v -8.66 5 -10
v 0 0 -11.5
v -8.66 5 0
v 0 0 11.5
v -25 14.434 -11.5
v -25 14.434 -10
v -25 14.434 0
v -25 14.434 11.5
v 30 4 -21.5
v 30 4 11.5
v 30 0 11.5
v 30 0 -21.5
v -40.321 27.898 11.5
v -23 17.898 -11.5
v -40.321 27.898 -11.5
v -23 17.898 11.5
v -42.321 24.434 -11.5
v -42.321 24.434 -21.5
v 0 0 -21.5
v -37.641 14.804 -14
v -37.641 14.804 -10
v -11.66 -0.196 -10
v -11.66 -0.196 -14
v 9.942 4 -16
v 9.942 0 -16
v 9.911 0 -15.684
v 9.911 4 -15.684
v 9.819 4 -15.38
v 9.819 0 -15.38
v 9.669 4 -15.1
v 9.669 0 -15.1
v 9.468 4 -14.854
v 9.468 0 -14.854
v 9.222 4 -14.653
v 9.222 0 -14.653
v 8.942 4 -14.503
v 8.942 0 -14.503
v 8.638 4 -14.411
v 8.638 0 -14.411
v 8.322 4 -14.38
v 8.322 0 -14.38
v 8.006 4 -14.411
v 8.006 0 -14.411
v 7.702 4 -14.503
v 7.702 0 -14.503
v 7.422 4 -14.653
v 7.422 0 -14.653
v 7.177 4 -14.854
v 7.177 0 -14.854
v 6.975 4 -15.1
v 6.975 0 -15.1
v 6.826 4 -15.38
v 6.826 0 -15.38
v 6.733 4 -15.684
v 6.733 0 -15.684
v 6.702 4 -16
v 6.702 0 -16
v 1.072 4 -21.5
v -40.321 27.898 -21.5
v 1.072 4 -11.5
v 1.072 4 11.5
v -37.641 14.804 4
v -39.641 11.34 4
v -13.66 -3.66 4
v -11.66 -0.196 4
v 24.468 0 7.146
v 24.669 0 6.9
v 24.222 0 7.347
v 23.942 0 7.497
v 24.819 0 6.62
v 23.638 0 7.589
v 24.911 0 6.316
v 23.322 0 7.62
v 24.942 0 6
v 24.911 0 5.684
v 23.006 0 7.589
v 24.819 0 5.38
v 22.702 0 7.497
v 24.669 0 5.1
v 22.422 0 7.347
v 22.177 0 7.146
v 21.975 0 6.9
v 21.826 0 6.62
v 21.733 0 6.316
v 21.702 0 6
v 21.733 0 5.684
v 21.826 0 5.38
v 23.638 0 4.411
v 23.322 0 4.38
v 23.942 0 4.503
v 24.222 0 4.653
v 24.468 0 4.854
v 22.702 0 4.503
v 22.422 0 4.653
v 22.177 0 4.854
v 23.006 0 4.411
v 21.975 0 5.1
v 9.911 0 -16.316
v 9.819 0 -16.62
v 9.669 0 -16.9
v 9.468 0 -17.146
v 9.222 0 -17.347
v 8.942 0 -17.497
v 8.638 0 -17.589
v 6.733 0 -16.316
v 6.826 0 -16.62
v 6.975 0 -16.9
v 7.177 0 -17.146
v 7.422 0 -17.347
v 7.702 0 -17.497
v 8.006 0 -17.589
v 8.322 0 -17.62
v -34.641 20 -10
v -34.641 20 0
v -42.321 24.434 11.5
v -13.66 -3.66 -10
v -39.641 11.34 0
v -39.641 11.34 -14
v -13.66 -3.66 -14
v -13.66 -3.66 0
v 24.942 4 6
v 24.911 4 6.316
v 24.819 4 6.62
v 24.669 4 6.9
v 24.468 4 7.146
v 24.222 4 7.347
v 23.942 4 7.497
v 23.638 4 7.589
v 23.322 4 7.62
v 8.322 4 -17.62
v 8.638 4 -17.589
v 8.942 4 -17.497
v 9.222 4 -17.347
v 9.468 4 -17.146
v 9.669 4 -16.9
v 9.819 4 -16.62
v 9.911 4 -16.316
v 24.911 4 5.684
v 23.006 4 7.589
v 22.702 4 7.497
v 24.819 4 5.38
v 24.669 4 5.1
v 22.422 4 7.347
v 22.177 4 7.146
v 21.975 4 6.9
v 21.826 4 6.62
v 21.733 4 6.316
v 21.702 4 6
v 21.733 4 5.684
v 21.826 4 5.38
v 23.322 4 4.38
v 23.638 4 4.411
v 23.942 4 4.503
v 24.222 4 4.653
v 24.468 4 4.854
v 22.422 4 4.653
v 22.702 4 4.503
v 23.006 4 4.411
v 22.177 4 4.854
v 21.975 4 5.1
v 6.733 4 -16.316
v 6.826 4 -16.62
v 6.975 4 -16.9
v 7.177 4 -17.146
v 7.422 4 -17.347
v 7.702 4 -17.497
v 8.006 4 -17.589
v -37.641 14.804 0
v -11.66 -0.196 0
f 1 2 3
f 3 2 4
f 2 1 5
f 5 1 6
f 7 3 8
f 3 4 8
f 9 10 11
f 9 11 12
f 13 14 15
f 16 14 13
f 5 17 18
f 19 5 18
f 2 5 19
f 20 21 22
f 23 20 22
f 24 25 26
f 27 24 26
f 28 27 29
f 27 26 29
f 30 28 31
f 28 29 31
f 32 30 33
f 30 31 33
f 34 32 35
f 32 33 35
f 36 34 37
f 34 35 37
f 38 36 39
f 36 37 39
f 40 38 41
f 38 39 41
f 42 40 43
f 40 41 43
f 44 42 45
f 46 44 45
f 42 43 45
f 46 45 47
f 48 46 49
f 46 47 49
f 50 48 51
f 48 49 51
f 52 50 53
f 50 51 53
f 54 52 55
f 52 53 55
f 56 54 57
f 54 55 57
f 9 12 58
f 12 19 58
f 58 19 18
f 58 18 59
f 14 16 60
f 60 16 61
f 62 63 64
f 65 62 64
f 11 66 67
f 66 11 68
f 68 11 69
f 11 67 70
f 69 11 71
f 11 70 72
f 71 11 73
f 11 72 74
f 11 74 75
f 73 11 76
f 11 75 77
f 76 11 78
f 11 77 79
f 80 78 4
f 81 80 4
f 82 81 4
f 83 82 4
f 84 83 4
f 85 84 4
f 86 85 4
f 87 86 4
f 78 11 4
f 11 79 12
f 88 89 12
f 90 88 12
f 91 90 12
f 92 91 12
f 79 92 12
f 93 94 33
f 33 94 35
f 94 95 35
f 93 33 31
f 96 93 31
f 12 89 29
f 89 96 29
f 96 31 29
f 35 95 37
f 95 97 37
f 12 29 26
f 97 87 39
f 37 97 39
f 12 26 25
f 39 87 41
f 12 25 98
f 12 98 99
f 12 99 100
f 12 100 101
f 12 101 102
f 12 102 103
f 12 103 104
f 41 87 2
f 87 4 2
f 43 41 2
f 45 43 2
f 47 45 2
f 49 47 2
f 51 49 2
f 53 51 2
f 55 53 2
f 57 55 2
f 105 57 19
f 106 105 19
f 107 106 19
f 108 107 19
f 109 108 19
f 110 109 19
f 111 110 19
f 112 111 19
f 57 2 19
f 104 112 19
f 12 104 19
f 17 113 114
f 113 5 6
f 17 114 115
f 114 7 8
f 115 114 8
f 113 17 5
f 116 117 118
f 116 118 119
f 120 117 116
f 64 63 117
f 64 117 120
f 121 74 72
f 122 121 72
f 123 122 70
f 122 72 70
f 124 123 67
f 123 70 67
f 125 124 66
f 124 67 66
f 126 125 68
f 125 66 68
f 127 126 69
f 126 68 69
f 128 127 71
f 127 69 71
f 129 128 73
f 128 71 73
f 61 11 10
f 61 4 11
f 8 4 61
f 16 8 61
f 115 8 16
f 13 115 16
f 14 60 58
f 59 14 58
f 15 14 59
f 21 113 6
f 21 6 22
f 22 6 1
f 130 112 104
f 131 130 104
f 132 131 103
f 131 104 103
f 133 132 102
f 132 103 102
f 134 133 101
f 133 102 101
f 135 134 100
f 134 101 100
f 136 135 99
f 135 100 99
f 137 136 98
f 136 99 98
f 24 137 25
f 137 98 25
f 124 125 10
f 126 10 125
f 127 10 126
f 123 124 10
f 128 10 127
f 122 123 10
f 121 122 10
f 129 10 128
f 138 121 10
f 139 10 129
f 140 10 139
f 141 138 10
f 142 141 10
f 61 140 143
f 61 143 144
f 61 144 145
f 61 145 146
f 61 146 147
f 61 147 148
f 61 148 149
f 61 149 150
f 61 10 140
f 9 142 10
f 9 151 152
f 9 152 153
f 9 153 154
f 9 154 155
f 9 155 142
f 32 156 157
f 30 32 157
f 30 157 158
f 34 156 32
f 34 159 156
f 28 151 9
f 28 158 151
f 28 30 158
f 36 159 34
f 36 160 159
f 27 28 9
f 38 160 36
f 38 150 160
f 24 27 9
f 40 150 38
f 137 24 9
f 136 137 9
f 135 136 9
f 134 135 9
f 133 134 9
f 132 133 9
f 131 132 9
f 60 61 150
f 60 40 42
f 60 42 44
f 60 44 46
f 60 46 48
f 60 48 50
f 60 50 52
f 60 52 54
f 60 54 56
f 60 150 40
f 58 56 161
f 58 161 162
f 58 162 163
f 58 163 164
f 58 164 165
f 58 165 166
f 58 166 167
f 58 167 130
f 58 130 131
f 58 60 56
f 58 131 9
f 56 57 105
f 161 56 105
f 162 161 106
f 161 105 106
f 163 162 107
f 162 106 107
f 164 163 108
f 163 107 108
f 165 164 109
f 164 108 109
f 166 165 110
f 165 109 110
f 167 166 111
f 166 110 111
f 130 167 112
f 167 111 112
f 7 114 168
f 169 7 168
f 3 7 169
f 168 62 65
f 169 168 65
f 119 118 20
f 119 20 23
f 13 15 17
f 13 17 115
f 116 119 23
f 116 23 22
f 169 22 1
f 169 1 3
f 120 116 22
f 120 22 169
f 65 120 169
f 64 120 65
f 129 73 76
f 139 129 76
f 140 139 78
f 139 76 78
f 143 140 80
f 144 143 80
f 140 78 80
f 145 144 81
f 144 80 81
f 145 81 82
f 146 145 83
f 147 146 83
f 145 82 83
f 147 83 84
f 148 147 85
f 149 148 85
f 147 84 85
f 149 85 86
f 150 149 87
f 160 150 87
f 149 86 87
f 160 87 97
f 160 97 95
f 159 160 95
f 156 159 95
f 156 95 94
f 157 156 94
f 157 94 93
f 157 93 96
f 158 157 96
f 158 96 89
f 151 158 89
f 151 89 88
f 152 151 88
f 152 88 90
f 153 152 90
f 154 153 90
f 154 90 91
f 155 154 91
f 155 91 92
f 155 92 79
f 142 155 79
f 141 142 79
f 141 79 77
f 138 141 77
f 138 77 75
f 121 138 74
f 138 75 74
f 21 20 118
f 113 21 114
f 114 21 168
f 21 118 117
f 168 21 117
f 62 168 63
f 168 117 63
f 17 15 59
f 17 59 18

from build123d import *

# Parameters (mm, degrees)
SKETCH1_W           = 50
SKETCH1_H           = 23
BOSS_EXTRUDE1_DEPTH = 20
CUT_EXTRUDE3_DEPTH  = 30
CUT_EXTRUDE4_DEPTH  = 30
SKETCH9_W           = 23
SKETCH9_H           = 4
BOSS_EXTRUDE2_DEPTH = 20
BOSS_EXTRUDE3_DEPTH = 10
SKETCH22_W          = 33
SKETCH22_H          = 4
BOSS_EXTRUDE4_DEPTH = 5
CUT_EXTRUDE7_DEPTH  = 5
SKETCH26_W          = 30
SKETCH26_H          = 10
BOSS_EXTRUDE5_DEPTH = 10
SKETCH28_W          = 30
SKETCH28_H          = 18
BOSS_EXTRUDE6_DEPTH = 4


with BuildPart() as part:
    # Sketch1 → Boss-Extrude1 (new body)
    with BuildSketch(Plane(origin=(0, 0, 0), x_dir=(1, 0, 0), z_dir=(0, 1, 0))):
        Rectangle(SKETCH1_W, SKETCH1_H)
    extrude(amount=BOSS_EXTRUDE1_DEPTH)

    # Sketch2 → Cut-Extrude3 (cut)
    with BuildSketch(Plane.XY.offset(11.5)):
        Polygon((0, 0), (-25, 14.43375673), (-25, 0), align=None)
        Polygon((1.07179677, 4), (25, 4), (25, 20), (-25, 20), (-25, 19.052558883), align=None)
    extrude(amount=-CUT_EXTRUDE3_DEPTH, mode=Mode.SUBTRACT)

    # Sketch4 → Cut-Extrude4 (cut)
    with BuildSketch(Plane.XY.offset(11.5)):
        Polygon((-25, 14.43375673), (-23, 17.897858345), (-25, 19.052558883), align=None)
    extrude(amount=-CUT_EXTRUDE4_DEPTH, mode=Mode.SUBTRACT)

    # Sketch9 → Boss-Extrude2 (add)
    with BuildSketch(Plane(origin=(-25, 14.43375673, 0), x_dir=(0, 0, 1), z_dir=(-0.8660254037844407, 0.4999999999999965, 0))):
        with Locations((0, 2)):
            Rectangle(SKETCH9_W, SKETCH9_H)
    extrude(amount=BOSS_EXTRUDE2_DEPTH)

    # Sketch11 → Boss-Extrude3 (add)
    with BuildSketch(Plane(origin=(0, 0, -11.5), x_dir=(-1, 0, 0), z_dir=(0, 0, -1))):
        Polygon((-25, 4), (-1.07179677, 4), (40.320508076, 27.897858345), (42.320508076, 24.43375673), (0, 0), (-25, 0), align=None)
    extrude(amount=BOSS_EXTRUDE3_DEPTH)

    # Sketch22 → Boss-Extrude4 (add)
    with BuildSketch(Plane(origin=(25, 0, 0), x_dir=(0, 0, -1), z_dir=(1, 0, 0))):
        with Locations((5, 2)):
            Rectangle(SKETCH22_W, SKETCH22_H)
    extrude(amount=BOSS_EXTRUDE4_DEPTH)

    # Sketch23 → Cut-Extrude7 (cut)
    with BuildSketch(Plane.XZ):
        with BuildLine():
            ThreePointArc((23.322235494, 7.62), (22.176722509, 4.854487014), (24.942235494, 6))
            Line((24.942235494, 6), (23.322235494, 6))
            Line((23.322235494, 6), (23.322235494, 7.62))
        make_face()
        with BuildLine():
            Line((23.322235494, 6), (24.942235494, 6))
            ThreePointArc((24.942235494, 6), (24.46774848, 7.145512986), (23.322235494, 7.62))
            Line((23.322235494, 7.62), (23.322235494, 6))
        make_face()
        with BuildLine():
            ThreePointArc((6.702235494, -16), (7.176722509, -17.145512986), (8.322235494, -17.62))
            Line((8.322235494, -17.62), (8.322235494, -16))
            Line((8.322235494, -16), (6.702235494, -16))
        make_face()
        with BuildLine():
            Line((8.322235494, -16), (8.322235494, -17.62))
            ThreePointArc((8.322235494, -17.62), (9.46774848, -17.145512986), (9.942235494, -16))
            ThreePointArc((9.942235494, -16), (8.322235494, -14.38), (6.702235494, -16))
            Line((6.702235494, -16), (8.322235494, -16))
        make_face()
    extrude(amount=-CUT_EXTRUDE7_DEPTH, mode=Mode.SUBTRACT)

    # Sketch26 → Boss-Extrude5 (add)
    with BuildSketch(Plane(origin=(0, 0, 0), x_dir=(0.8660254037844417, -0.4999999999999946, 0), z_dir=(-0.4999999999999946, -0.8660254037844417, 0))):
        with Locations((-25, -5)):
            Rectangle(SKETCH26_W, SKETCH26_H)
    extrude(amount=BOSS_EXTRUDE5_DEPTH)

    # Sketch28 → Boss-Extrude6 (add)
    with BuildSketch(Plane(origin=(-5, -8.660254038, 0), x_dir=(0.8660254037844417, -0.4999999999999946, 0), z_dir=(-0.4999999999999946, -0.8660254037844417, 0))):
        with Locations((-25, -5)):
            Rectangle(SKETCH28_W, SKETCH28_H)
    extrude(amount=-BOSS_EXTRUDE6_DEPTH)


solid = part.part
